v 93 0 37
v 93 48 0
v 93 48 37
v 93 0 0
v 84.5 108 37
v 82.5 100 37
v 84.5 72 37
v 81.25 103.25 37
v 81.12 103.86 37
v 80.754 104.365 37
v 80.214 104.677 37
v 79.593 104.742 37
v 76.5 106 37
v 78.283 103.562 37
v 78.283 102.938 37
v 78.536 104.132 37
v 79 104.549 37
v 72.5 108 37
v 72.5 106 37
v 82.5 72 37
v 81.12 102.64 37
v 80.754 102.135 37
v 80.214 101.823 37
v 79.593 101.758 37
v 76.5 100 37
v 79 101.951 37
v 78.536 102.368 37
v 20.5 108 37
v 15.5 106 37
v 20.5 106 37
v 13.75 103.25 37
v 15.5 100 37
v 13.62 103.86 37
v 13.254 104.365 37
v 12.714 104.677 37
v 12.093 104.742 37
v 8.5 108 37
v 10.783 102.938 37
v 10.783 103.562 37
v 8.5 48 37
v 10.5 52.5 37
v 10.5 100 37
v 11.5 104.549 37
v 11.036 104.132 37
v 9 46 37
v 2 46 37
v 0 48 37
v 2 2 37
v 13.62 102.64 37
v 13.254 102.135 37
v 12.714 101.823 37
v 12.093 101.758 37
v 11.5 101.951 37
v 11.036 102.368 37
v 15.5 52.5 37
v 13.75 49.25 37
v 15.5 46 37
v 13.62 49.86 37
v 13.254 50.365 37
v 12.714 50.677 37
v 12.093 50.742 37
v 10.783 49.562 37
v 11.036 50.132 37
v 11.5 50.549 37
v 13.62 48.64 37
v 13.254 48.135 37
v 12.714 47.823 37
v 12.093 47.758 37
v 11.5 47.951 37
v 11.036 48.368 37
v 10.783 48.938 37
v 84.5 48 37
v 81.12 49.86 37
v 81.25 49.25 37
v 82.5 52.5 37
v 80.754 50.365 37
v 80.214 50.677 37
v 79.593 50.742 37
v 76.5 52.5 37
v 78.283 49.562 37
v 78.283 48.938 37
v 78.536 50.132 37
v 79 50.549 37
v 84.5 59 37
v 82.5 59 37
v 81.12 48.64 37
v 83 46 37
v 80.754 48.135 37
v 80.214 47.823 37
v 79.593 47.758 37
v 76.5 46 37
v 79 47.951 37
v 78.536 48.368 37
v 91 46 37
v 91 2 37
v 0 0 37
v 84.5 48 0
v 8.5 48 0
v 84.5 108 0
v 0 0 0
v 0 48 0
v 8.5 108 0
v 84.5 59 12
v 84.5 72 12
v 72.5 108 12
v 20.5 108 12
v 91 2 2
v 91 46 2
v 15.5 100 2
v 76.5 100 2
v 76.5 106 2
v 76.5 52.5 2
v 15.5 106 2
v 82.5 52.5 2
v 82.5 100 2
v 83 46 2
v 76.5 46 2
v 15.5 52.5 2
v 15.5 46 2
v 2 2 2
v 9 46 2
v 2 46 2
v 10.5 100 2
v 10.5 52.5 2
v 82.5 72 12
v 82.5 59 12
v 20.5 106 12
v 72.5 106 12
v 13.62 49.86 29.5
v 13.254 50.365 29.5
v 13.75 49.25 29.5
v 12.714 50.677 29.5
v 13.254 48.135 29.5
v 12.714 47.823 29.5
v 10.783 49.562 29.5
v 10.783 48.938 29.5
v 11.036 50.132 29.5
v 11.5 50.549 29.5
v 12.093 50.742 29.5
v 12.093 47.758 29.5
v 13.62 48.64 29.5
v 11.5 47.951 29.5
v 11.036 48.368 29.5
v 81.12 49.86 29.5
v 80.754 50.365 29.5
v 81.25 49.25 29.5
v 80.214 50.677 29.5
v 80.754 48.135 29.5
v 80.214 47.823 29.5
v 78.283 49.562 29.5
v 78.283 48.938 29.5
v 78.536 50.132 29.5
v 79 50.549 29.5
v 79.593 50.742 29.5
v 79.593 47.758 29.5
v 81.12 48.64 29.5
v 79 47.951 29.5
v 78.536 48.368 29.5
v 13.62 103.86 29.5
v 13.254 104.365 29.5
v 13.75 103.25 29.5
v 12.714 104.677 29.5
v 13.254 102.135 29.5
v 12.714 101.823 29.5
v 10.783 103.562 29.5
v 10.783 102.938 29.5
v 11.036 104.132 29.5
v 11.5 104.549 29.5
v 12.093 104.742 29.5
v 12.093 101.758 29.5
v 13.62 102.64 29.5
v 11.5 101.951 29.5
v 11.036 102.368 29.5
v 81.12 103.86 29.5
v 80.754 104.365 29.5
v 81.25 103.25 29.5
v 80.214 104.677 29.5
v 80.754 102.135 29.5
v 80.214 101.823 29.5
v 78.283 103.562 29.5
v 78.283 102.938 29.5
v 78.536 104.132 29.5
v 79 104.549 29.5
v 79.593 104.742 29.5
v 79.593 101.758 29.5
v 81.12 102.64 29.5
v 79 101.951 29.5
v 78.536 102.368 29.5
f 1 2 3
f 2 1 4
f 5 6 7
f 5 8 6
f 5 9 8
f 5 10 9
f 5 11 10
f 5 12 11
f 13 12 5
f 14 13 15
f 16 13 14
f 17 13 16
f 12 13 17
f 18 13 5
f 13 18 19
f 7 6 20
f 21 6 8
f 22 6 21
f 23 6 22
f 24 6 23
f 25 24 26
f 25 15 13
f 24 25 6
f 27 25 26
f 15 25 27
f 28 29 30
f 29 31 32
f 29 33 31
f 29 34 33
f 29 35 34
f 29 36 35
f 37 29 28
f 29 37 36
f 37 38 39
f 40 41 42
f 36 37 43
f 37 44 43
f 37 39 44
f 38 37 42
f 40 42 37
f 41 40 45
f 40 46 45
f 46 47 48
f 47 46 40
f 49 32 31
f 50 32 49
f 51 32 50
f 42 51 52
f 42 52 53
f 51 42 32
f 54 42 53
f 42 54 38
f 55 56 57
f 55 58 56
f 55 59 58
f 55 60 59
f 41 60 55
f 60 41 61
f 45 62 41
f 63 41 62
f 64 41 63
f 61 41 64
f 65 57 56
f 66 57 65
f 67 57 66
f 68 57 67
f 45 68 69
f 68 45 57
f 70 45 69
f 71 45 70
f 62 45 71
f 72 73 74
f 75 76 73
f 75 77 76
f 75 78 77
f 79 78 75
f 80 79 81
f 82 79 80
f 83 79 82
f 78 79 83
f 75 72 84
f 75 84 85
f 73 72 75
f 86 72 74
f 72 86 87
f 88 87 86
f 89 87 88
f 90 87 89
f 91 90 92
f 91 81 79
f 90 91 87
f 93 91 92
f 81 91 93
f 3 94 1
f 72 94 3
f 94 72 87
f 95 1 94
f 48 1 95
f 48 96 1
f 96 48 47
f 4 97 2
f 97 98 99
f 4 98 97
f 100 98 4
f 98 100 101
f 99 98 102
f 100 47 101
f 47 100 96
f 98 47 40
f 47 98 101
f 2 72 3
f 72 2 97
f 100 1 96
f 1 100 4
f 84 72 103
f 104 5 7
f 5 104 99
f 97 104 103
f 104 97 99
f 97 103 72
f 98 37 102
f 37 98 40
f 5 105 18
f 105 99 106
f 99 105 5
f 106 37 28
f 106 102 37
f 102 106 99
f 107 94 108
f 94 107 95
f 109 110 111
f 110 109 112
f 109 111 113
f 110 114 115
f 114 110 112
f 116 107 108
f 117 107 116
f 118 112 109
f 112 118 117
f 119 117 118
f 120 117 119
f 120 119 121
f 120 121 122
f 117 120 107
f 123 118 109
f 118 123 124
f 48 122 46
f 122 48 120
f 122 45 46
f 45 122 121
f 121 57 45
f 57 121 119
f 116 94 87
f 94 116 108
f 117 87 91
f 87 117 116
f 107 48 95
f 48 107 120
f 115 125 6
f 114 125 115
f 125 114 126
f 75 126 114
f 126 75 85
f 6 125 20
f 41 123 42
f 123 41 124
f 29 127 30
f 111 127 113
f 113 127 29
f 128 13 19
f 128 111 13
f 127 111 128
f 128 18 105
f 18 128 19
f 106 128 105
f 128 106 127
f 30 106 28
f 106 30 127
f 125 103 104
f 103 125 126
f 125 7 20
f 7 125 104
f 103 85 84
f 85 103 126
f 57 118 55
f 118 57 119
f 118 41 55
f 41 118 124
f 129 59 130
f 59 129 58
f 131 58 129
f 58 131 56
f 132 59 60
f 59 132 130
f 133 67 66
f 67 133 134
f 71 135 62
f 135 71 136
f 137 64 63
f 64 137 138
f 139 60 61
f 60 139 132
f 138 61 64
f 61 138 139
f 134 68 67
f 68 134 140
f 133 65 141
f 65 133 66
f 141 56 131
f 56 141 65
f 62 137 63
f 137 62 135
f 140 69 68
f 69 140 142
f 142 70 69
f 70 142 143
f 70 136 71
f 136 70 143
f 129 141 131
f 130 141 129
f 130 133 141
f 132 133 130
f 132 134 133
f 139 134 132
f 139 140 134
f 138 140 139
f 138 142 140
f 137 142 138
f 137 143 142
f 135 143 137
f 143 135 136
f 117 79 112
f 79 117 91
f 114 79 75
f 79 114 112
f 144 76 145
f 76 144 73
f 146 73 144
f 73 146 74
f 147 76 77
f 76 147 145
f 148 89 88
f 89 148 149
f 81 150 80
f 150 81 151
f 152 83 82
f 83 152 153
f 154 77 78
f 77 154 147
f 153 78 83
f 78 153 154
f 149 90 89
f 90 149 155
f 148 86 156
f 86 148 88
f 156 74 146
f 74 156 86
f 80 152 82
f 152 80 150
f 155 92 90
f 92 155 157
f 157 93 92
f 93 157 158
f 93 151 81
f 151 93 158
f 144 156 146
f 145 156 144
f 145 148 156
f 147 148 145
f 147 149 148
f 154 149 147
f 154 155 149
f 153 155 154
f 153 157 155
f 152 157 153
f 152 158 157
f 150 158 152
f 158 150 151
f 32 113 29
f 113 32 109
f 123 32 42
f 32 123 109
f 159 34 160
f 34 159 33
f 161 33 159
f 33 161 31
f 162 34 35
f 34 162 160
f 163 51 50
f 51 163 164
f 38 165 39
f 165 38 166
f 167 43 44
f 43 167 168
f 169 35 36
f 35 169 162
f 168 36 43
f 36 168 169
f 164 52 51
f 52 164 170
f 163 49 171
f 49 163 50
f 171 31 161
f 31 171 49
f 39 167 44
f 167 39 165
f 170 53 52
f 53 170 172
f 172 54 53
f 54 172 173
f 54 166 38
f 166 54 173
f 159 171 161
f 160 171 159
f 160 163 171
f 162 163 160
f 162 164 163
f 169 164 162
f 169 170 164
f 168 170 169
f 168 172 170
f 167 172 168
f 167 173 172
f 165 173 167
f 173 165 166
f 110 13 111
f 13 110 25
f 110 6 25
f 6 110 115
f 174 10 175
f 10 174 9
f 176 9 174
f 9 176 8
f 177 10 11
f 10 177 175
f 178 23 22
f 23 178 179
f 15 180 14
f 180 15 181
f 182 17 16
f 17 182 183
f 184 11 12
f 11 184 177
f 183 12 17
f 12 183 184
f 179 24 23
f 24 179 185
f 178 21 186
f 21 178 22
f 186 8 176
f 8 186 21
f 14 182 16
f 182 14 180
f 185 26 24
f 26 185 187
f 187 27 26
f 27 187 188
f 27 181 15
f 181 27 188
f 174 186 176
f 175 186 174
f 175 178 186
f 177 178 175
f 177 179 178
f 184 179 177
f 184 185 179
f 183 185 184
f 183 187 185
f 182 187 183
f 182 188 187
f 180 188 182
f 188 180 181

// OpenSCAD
module heat_set_insert(translate_pos = [0,0,0], insert_xy_dim = [6.5,6.5], insert_height = 37, hole_r=1.5, hole_h=7.5, cylinder_fn = 15){
    insert_width = insert_xy_dim[0];
    insert_depth = insert_xy_dim[1];
    insert_height = insert_height;
    
    translate(translate_pos){
        difference(){
        cube([insert_width,insert_depth,insert_height]);
            translate([insert_width/2,insert_depth/2,insert_height - hole_h]){
                cylinder(hole_h+1,hole_r,hole_r, $fn=cylinder_fn);
            }
        }
    }
}

z_size = 35;
thickness = 2;
chassis_lcd_dim = [93,48,z_size+thickness];
chassis_perfboard_dim = [76,90,z_size+thickness];

difference(){
    union(){
    cube(chassis_lcd_dim);
    translate([15-6.5,18,0]){
    cube(chassis_perfboard_dim);
        }
    }

    //make wall
    translate([thickness,thickness,thickness]){
    union(){
    cube([chassis_lcd_dim[0]-(thickness*2),chassis_lcd_dim[1]-(thickness*2),chassis_lcd_dim[2]]);
    translate([15-6.5,18,0]){
    cube([chassis_perfboard_dim[0]-(thickness*2),chassis_perfboard_dim[1]-(thickness*2),chassis_perfboard_dim[2]]);
        }
    }
    }

    // SMA hole
    translate([thickness,thickness,thickness+10]){
    translate([15-6.5+10,18,0]){
    cube([chassis_perfboard_dim[0]-(thickness*2)-20,chassis_perfboard_dim[1],chassis_perfboard_dim[2]]);
        }
    }

// USB hole
translate([50,57+thickness,thickness+10]){
cube([100,13,30]);
    }

}
heat_set_insert([9,46,0]);
heat_set_insert([9+76-6.5-2,46,0]);

heat_set_insert([9,100,0]);
heat_set_insert([9+76-6.5-2,100,0]);
